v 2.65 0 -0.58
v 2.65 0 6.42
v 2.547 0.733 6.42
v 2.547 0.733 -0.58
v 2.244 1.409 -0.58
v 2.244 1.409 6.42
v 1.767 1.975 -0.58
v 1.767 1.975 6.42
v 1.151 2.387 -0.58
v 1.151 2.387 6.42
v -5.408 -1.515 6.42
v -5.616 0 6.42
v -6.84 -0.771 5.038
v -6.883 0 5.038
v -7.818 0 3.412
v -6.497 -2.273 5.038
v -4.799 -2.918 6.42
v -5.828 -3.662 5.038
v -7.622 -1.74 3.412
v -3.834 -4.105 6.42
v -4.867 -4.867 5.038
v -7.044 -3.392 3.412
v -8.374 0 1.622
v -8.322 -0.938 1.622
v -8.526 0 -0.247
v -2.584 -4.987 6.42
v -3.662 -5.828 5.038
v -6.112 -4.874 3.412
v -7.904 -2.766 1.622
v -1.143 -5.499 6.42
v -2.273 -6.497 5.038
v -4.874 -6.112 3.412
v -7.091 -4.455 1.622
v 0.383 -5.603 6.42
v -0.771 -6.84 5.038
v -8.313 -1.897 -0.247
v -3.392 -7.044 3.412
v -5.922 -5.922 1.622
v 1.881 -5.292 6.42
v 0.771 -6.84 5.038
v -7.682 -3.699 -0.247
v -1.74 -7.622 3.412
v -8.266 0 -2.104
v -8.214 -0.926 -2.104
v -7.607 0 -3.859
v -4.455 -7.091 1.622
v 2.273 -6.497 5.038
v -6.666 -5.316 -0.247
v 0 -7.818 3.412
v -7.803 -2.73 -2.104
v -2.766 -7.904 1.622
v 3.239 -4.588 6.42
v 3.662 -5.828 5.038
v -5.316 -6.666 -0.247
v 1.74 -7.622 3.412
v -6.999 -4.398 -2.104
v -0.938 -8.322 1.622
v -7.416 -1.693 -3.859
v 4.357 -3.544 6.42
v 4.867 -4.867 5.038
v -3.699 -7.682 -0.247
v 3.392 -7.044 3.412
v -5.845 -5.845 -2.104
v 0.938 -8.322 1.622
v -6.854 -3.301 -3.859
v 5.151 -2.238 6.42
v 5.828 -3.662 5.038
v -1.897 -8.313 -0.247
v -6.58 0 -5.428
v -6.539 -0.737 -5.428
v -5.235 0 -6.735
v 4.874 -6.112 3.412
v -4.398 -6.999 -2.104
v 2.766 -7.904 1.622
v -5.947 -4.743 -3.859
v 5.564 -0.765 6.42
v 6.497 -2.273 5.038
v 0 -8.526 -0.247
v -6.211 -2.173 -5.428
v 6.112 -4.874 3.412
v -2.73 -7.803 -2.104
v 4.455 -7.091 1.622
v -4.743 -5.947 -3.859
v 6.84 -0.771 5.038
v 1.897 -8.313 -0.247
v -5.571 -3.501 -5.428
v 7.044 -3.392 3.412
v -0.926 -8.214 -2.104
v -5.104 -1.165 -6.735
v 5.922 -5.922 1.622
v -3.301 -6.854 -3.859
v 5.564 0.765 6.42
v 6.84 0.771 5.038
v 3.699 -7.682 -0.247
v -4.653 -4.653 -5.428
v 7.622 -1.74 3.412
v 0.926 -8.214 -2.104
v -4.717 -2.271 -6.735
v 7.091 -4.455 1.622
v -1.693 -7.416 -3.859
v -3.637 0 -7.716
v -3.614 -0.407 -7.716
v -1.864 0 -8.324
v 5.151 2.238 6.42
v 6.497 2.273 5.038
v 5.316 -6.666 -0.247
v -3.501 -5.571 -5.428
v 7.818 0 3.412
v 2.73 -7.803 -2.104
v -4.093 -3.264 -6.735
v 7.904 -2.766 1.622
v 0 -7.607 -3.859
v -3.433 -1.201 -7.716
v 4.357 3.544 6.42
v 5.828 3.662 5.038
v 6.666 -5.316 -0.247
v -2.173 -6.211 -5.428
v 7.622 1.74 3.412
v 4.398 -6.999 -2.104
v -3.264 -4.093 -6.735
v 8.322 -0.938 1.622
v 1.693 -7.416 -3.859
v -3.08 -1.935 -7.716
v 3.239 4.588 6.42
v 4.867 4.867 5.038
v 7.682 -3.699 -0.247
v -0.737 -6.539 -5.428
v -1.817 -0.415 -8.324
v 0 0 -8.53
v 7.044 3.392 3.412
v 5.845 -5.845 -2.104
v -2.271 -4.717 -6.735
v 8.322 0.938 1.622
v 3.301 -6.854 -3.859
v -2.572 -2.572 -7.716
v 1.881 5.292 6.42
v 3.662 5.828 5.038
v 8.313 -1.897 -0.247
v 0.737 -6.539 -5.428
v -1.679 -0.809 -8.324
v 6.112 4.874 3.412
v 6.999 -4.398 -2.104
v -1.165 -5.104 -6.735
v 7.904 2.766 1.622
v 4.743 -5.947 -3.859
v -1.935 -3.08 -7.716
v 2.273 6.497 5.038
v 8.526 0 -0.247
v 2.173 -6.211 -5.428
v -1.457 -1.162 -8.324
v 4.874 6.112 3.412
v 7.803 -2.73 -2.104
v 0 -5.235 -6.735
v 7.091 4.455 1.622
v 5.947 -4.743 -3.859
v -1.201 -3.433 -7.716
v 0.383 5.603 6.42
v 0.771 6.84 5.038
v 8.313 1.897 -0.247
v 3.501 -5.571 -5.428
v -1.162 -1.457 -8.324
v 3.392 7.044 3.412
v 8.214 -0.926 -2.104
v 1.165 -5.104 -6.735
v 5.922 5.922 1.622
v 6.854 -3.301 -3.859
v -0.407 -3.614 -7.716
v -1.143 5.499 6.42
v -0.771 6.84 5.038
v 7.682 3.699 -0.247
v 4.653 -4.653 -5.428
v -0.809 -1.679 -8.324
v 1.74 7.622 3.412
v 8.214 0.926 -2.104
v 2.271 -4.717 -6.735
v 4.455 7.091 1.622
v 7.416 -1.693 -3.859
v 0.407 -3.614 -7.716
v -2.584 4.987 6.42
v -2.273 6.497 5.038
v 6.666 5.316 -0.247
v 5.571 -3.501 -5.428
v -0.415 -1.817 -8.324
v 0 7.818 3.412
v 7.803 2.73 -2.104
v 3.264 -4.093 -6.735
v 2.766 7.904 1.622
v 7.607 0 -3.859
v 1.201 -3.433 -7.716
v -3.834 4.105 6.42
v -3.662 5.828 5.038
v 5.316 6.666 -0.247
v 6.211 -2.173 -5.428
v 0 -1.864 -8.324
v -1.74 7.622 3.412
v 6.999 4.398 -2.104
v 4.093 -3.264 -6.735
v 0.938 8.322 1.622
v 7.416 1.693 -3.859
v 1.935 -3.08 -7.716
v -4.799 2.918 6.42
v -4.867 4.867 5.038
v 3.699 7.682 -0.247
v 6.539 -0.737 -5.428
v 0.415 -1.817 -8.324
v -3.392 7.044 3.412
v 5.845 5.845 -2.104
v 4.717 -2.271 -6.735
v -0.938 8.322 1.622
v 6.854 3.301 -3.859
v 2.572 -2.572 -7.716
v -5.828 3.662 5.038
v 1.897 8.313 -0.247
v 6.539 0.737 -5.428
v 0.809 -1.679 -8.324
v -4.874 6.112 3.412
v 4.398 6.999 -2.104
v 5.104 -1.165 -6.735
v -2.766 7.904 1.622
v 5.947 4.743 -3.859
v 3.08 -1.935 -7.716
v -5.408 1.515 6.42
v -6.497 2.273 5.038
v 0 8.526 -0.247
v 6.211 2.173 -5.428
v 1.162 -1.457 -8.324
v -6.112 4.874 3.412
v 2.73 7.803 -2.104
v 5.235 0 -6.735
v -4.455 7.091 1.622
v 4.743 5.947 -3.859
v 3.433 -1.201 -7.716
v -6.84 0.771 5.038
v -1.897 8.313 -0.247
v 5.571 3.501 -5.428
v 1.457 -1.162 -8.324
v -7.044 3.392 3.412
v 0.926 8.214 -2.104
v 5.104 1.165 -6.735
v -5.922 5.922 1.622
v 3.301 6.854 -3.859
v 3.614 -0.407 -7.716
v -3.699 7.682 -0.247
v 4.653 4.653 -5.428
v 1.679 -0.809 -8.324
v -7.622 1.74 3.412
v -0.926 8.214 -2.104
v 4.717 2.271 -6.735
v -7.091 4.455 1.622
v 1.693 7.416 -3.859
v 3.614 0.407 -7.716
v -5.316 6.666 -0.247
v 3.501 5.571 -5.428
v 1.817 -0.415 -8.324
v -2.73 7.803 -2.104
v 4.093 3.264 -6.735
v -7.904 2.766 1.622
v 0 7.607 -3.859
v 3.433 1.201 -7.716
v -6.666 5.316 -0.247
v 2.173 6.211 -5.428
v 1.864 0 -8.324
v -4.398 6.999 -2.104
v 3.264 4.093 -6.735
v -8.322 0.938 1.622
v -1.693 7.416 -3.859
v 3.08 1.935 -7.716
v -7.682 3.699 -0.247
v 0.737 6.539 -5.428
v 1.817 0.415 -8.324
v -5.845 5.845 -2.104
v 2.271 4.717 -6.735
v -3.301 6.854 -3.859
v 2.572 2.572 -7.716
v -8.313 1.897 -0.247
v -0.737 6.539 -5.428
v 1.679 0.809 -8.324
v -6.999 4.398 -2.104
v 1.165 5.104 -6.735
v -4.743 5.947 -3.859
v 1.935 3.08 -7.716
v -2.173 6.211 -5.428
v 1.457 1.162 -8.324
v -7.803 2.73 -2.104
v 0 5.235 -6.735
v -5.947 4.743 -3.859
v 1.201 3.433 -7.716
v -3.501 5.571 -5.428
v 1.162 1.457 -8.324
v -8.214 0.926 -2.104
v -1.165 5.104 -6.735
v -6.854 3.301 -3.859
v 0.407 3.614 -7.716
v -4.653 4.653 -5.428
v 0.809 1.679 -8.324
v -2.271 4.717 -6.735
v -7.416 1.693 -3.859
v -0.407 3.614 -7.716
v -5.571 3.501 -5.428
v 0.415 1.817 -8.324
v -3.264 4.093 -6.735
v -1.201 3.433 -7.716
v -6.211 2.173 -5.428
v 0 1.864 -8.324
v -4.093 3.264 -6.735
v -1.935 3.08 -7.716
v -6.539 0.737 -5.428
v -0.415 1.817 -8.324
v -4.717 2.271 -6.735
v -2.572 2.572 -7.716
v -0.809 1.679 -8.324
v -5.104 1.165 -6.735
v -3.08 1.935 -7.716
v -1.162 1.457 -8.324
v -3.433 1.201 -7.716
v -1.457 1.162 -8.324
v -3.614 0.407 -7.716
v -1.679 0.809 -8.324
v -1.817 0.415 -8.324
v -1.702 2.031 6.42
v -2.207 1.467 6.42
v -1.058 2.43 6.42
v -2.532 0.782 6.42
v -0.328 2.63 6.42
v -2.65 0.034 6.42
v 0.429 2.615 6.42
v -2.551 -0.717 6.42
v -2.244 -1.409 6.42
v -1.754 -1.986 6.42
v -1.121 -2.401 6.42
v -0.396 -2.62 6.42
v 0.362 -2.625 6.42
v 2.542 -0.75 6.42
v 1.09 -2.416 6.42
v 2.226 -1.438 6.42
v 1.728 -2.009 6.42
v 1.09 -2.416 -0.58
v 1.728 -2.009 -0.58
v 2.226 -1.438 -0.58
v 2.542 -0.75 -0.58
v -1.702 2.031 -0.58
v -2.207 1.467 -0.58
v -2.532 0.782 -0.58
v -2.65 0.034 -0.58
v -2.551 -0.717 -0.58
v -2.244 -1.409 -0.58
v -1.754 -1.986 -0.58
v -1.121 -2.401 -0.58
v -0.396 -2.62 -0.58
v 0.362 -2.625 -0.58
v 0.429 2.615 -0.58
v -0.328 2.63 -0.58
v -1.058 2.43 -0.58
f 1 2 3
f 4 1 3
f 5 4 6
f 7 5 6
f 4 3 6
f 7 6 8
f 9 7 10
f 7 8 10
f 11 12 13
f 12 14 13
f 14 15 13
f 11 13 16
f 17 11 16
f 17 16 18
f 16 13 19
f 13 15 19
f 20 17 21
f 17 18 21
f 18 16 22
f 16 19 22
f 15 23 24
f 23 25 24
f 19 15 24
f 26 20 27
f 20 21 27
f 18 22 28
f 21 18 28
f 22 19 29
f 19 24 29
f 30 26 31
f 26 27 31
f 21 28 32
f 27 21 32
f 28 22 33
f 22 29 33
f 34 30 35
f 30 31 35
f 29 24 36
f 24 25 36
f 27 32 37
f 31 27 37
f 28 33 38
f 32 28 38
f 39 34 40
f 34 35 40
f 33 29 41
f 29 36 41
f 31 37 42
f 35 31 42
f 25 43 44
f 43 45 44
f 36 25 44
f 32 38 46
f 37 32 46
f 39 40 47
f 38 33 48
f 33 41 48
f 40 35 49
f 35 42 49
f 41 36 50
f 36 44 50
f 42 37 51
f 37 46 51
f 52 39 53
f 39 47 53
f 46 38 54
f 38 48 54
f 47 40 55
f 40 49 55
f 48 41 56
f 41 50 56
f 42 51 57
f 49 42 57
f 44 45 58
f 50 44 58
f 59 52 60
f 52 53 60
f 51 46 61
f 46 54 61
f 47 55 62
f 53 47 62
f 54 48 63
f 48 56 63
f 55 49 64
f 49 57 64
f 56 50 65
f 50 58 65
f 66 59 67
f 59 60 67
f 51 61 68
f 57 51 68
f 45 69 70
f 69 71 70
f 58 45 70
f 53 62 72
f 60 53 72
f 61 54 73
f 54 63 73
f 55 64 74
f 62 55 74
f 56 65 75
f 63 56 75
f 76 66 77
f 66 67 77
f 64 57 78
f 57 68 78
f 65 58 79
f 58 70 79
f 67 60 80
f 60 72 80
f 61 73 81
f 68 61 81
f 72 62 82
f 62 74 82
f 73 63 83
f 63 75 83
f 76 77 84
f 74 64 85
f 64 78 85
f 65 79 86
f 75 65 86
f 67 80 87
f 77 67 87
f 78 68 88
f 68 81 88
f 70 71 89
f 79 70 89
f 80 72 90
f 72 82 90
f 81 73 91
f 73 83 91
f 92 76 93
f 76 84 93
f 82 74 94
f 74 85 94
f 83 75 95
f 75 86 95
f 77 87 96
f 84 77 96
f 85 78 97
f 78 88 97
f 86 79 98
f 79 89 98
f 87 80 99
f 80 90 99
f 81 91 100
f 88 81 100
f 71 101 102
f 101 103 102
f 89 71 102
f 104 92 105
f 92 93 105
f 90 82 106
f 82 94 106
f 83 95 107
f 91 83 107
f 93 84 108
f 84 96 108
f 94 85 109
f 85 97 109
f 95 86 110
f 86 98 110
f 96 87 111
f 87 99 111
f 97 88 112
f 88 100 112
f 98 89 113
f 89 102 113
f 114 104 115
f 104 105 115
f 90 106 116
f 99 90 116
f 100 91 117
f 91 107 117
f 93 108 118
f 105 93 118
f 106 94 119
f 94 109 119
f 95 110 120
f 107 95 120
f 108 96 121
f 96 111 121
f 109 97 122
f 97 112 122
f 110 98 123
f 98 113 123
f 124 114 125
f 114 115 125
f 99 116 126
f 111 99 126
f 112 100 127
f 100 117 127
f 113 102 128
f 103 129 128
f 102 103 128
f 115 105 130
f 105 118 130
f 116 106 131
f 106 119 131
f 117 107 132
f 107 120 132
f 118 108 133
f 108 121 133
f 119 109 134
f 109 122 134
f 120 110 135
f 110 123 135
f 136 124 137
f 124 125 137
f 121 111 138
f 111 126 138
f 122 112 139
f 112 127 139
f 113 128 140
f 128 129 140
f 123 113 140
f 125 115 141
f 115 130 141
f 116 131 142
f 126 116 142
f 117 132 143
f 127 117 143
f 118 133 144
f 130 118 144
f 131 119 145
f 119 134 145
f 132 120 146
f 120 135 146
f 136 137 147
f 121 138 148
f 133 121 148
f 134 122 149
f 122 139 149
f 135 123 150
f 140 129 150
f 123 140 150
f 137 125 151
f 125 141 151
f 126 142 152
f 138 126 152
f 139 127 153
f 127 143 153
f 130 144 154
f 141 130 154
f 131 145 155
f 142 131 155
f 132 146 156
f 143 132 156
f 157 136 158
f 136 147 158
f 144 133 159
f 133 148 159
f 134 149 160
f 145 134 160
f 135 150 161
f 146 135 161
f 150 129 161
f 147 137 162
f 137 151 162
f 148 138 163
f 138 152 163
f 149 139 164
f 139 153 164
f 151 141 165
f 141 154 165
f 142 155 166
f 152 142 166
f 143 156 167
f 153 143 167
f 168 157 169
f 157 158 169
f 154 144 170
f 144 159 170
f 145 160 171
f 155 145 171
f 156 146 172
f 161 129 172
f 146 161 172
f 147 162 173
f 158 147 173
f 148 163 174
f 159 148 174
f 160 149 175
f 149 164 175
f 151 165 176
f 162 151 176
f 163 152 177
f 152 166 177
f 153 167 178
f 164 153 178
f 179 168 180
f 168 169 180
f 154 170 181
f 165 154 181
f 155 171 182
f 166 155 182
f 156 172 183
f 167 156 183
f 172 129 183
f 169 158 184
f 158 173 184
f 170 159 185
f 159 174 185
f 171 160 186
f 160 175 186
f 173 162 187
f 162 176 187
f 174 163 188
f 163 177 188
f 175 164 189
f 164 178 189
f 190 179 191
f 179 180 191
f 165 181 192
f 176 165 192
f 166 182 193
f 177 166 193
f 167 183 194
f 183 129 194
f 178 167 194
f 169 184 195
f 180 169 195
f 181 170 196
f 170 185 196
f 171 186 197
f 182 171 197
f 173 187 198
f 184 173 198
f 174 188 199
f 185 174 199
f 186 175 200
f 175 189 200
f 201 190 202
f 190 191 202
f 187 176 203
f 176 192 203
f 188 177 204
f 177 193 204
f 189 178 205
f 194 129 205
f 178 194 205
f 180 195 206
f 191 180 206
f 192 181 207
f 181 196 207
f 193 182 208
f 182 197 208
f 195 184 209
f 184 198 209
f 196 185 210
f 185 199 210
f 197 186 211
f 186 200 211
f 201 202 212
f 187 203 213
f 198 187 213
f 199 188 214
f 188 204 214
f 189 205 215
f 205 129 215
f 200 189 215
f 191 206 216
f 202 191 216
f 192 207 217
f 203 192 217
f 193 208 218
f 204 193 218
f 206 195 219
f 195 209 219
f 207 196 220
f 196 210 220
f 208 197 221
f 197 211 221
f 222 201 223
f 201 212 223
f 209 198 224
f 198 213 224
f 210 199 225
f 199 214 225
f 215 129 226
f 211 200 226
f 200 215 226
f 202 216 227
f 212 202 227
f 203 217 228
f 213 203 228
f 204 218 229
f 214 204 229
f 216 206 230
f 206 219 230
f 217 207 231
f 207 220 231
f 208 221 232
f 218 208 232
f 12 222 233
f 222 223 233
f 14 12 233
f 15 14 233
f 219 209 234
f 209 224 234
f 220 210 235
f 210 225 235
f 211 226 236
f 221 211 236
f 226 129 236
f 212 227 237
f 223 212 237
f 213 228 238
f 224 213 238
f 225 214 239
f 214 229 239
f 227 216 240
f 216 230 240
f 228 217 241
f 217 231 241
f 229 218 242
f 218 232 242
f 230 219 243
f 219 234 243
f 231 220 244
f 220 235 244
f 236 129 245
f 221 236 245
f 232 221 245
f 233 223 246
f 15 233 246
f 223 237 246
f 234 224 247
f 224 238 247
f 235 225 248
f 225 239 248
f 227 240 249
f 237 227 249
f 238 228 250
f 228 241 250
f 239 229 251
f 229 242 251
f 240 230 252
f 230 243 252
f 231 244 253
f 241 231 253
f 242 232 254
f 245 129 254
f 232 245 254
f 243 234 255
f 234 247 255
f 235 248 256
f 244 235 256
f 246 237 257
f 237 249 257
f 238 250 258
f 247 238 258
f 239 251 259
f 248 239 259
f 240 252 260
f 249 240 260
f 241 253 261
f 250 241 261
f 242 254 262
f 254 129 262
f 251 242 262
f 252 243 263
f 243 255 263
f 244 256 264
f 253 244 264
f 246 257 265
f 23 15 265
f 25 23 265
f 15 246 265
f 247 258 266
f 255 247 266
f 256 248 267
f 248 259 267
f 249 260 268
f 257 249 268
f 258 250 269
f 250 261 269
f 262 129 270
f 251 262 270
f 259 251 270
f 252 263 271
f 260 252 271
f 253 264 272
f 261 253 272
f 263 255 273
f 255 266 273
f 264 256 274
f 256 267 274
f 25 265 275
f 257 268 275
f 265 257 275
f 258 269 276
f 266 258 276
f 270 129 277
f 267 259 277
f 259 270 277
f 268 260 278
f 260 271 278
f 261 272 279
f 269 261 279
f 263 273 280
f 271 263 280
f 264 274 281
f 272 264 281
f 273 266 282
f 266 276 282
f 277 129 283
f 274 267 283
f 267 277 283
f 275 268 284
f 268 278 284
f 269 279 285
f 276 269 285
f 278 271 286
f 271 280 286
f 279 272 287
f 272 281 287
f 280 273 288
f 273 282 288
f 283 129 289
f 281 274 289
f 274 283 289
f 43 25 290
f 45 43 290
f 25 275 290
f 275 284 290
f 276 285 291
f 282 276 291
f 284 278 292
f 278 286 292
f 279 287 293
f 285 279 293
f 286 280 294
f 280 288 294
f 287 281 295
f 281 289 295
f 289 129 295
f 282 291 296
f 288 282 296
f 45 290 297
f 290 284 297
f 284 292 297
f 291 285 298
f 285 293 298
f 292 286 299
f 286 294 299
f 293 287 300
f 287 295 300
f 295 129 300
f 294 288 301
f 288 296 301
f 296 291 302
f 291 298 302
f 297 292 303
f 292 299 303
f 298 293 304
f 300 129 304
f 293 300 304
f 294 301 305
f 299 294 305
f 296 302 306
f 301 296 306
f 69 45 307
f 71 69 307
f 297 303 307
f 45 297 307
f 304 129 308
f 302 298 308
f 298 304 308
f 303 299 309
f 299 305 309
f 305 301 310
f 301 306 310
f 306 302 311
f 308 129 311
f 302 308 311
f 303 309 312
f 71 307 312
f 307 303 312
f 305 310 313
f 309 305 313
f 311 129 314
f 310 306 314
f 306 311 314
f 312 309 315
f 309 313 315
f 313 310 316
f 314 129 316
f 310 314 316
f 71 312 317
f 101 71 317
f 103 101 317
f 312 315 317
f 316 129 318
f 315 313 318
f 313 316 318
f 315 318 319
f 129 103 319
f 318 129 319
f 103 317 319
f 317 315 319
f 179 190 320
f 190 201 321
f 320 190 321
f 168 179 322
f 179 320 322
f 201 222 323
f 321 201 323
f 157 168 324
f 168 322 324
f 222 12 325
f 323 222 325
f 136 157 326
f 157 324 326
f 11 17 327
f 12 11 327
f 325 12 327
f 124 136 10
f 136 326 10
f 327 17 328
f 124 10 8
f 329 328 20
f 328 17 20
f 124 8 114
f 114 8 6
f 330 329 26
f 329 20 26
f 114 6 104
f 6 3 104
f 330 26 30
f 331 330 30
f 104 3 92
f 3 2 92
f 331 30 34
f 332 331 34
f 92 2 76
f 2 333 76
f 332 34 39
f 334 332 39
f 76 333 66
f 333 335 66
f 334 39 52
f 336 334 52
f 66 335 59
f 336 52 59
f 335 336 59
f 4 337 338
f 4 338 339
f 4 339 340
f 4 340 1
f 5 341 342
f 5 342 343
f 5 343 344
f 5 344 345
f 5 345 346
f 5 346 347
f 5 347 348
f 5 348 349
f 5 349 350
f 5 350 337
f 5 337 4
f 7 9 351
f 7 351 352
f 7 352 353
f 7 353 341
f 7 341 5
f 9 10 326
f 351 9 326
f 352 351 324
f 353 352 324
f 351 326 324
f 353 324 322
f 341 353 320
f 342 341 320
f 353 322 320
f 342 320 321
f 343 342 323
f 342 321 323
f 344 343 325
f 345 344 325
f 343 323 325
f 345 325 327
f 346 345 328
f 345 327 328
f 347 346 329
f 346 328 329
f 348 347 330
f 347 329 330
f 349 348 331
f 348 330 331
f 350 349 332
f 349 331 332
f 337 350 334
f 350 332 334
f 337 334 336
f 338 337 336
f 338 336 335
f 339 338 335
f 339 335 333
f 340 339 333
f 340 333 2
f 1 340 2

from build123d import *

# Parameters (mm, degrees)
F3_DEPTH = 20
F5_DEPTH = 7


with BuildPart() as f1:
    # F0 (on Front) → F1 (revolve)
    with BuildSketch(Plane.XZ):
        with BuildLine():
            Line((0, 0), (0, 8.53))
            ThreePointArc((0, 8.53), (-8.53, 0), (0, -8.53))
            Line((0, -8.53), (0, 0))
        make_face()
    revolve(axis=Axis((0, 0, 4.265), (0, 0, 1)))

    # F2 (on Front) → F3 (cut, symmetric)
    with BuildSketch(Plane.XZ):
        Polygon((-44.582818, 6.42), (0, 6.42), (47.697775, 6.42), (0, 28.326638), align=None)
    extrude(amount=F3_DEPTH, both=True, mode=Mode.SUBTRACT)

    # F4 (on face) → F5 (cut)
    with BuildSketch(Plane.XY.offset(6.42)):
        with BuildLine():
            ThreePointArc((1.151499, 2.386745), (-2.244323, -1.409083), (2.65, 0))
            ThreePointArc((2.65, 0), (2.244323, 1.409083), (1.151499, 2.386745))
        make_face()
    extrude(amount=-F5_DEPTH, mode=Mode.SUBTRACT)


solid = f1.part
